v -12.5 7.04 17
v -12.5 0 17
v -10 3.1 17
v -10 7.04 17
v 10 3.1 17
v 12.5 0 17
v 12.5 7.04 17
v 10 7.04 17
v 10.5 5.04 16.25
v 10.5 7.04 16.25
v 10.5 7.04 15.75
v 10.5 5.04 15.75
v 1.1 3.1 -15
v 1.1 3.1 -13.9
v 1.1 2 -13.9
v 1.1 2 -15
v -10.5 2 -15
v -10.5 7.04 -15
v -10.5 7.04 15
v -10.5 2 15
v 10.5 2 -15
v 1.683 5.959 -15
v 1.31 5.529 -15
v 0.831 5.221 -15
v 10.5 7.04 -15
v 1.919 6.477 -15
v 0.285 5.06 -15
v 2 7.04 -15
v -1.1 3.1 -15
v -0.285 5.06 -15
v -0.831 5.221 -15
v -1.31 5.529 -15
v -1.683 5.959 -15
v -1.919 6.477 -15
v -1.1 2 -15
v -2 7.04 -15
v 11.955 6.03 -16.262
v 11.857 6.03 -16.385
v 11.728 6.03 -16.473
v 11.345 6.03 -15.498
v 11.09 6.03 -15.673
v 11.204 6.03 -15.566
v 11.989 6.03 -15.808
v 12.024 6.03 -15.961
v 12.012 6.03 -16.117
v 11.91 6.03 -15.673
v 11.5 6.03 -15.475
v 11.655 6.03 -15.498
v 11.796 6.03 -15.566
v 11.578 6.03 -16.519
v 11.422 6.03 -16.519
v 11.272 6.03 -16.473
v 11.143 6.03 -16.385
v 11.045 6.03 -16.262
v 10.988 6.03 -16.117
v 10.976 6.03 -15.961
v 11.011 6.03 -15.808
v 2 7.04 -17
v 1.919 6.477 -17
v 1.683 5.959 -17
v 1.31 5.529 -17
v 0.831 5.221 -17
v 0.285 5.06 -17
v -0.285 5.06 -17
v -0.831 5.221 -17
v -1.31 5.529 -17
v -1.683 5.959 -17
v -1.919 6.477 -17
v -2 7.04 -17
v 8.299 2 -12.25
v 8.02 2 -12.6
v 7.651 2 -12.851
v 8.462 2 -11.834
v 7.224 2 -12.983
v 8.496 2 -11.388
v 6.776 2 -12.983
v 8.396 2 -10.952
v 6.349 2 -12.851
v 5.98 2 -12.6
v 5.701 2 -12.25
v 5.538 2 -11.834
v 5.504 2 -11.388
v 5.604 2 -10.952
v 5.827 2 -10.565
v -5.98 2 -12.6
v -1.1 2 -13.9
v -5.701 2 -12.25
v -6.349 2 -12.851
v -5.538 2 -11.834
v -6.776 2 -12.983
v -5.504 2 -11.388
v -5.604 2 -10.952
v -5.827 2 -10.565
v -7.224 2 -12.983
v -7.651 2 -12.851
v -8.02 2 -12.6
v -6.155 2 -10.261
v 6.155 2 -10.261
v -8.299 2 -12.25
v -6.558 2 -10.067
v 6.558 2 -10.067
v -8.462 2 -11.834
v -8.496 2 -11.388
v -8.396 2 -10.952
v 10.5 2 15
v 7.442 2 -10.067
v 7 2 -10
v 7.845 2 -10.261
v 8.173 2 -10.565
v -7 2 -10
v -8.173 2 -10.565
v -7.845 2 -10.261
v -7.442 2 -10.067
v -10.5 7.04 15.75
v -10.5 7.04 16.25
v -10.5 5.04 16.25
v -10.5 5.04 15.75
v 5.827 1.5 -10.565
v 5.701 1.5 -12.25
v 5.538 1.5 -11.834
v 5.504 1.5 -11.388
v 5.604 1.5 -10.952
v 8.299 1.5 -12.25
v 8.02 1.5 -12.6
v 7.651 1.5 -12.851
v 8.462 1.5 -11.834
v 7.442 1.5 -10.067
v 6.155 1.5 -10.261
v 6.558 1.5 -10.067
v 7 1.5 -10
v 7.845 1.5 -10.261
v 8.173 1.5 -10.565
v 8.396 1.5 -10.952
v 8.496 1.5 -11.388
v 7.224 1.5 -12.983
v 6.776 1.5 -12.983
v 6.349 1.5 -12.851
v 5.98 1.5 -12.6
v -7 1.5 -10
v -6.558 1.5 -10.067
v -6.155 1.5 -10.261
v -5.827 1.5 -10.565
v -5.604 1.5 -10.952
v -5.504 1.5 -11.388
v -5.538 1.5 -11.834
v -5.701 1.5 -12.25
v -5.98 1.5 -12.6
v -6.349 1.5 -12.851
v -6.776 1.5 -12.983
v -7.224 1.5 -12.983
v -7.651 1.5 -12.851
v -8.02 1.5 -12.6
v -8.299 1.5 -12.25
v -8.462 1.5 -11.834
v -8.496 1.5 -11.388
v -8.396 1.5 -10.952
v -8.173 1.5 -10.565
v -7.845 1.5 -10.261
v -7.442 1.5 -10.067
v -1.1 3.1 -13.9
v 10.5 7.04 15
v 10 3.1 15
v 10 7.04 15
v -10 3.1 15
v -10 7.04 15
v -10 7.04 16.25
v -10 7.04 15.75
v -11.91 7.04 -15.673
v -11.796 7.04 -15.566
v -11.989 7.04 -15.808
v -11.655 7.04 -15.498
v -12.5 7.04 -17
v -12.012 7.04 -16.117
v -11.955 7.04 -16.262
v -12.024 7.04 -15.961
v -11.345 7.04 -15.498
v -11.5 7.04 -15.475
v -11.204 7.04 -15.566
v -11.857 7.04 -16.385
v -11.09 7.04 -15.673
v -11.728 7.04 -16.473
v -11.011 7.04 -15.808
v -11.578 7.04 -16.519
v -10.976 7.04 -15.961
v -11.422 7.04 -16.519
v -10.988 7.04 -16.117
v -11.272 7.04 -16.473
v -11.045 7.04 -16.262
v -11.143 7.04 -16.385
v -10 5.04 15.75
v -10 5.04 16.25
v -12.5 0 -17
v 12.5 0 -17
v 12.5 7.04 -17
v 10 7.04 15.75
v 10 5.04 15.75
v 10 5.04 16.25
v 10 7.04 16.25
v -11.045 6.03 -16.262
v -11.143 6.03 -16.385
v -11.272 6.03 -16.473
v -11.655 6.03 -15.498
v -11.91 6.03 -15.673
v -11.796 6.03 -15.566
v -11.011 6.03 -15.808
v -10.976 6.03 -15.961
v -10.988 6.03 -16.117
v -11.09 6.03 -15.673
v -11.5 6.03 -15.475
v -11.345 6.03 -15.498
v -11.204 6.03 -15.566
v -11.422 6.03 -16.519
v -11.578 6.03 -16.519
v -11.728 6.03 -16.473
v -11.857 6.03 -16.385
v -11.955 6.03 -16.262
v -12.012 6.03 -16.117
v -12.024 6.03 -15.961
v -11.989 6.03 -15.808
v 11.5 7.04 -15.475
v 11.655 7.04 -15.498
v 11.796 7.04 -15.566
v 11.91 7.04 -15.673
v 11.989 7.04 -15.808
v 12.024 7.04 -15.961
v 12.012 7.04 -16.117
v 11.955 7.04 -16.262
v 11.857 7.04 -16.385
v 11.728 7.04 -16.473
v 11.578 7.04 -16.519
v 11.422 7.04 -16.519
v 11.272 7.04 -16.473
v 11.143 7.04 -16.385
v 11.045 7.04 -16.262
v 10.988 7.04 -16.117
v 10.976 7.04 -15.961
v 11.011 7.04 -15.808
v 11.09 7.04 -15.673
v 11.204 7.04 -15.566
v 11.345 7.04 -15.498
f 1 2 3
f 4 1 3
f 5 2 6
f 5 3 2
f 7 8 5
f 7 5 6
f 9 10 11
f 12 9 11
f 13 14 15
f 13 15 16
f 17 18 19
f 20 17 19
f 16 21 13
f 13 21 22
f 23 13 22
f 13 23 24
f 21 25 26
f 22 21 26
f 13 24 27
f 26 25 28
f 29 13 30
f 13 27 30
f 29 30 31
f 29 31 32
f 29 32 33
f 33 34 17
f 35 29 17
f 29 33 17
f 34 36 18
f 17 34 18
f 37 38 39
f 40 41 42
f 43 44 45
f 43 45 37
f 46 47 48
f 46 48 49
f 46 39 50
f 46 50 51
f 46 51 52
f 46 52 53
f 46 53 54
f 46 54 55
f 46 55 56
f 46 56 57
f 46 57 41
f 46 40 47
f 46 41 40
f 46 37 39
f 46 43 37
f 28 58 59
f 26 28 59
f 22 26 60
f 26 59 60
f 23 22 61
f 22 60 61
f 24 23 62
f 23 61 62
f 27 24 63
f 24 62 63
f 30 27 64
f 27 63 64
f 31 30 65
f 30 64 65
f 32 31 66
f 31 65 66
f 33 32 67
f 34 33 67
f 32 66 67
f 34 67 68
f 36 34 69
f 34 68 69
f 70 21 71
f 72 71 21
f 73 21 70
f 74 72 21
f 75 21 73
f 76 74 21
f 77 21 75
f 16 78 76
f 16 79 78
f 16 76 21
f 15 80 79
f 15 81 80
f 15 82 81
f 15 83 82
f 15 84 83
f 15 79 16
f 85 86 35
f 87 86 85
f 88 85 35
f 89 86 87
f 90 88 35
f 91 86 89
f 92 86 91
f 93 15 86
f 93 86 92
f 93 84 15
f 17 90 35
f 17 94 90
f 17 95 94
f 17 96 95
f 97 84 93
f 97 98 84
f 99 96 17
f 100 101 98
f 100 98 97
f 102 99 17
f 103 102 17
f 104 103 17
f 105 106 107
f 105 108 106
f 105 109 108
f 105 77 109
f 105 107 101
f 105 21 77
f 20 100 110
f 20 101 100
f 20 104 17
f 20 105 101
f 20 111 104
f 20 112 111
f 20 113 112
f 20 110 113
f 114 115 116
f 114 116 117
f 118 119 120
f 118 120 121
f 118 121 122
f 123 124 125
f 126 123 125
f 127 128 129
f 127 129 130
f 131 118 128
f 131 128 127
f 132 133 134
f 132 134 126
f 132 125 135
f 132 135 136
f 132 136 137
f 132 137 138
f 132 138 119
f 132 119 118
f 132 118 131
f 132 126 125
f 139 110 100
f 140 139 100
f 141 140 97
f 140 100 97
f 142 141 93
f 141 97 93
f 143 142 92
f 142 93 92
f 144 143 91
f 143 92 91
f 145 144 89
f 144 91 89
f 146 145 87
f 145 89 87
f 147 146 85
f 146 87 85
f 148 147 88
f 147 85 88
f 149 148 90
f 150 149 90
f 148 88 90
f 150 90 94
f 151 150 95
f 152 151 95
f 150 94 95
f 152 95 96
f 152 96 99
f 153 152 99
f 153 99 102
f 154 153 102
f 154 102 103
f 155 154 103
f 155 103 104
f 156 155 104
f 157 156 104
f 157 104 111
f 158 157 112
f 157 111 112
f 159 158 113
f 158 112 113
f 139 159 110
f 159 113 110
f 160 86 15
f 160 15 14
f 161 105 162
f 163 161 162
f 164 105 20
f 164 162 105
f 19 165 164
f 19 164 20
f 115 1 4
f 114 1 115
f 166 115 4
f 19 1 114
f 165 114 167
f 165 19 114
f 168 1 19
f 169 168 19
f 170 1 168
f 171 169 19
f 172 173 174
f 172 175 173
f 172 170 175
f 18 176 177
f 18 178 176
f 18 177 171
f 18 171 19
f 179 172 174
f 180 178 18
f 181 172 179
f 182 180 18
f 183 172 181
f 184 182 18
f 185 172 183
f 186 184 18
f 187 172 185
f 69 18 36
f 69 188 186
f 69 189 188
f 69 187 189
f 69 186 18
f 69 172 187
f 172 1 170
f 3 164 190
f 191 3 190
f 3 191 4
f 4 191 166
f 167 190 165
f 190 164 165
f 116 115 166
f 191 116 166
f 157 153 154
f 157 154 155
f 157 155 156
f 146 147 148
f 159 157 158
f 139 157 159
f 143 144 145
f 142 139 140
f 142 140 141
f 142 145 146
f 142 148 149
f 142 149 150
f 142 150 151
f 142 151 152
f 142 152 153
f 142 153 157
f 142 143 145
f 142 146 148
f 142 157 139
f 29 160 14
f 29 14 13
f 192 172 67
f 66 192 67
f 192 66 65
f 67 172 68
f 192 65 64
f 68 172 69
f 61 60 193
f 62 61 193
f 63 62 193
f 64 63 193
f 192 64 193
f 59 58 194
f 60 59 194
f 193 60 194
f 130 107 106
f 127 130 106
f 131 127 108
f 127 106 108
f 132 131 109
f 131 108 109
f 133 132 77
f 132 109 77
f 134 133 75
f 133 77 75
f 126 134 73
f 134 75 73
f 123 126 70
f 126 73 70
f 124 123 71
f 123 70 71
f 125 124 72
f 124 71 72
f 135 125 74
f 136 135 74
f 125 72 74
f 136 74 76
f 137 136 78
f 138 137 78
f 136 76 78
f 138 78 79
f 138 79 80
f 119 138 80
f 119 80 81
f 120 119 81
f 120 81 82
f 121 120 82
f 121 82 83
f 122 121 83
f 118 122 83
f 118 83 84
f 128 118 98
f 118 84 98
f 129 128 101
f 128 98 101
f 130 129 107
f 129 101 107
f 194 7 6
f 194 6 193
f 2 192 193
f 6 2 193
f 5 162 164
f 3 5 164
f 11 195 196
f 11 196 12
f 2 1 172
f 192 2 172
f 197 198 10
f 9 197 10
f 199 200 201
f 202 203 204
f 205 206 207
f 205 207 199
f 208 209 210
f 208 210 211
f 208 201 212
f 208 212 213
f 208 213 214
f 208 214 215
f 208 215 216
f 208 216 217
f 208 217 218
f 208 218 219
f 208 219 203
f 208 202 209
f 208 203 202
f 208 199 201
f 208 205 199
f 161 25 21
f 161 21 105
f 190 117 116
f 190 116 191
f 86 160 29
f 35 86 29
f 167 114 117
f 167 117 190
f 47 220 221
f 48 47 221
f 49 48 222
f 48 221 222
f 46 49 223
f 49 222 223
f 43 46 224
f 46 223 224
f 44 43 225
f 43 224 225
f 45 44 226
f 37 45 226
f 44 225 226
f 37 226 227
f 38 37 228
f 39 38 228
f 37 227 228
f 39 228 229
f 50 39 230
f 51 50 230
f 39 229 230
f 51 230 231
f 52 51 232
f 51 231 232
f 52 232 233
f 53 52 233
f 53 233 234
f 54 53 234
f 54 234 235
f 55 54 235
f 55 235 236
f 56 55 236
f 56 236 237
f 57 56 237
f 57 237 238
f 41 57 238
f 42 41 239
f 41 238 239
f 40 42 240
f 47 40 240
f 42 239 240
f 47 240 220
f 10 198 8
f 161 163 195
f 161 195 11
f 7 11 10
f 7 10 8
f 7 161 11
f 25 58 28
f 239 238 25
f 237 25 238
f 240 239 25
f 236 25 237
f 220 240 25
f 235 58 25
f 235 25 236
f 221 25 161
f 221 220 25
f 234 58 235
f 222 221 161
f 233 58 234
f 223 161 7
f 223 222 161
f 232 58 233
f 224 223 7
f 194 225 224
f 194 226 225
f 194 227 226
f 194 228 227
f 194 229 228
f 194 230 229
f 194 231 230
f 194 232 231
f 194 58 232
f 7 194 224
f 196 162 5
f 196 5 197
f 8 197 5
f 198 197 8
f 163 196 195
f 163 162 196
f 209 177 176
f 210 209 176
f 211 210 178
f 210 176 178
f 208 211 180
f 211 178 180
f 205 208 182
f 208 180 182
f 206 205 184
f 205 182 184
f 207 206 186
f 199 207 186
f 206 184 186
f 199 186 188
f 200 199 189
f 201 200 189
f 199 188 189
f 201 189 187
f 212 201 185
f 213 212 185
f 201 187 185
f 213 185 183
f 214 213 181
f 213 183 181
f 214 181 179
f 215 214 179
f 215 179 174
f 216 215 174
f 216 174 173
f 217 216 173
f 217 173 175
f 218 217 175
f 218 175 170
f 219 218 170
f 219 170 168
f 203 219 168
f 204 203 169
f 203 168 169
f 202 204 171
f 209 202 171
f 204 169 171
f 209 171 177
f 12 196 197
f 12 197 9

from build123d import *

# Parameters (mm, degrees)
IZIM1_W                     = 25
IZIM1_H                     = 34
Y_KSEKLIK_EKSTR_ZYON1_DEPTH = 7.04
IZIM2_W                     = 21
IZIM2_H                     = 30
KES_EKSTR_ZYON1_DEPTH       = 5.04
IZIM3_W                     = 20
IZIM3_H                     = 3.94
KES_EKSTR_ZYON2_DEPTH       = 36.068669778
FEDER1_START                = -1.1
FEDER1_OUTLINE_W            = 1.1
FEDER1_OUTLINE_H            = 1.1
FEDER1_DEPTH                = 2.2
IZIM7_W                     = 1
IZIM7_H                     = 0.5
KES_EKSTR_ZYON3_DEPTH       = 2
IZIM9_R                     = 2
KES_EKSTR_ZYON4_DEPTH       = 2
IZIM10_R                    = 1.5
KES_EKSTR_ZYON5_DEPTH       = 0.5
IZIM11_R                    = 0.525
KES_EKSTR_ZYON6_DEPTH       = 1.01


# Read off the part's stored shape, not the designer's step: Feder1
with BuildPart() as part:
    # Çizim1 → Yükseklik-Ekstrüzyon1 (new body)
    with BuildSketch(Plane(origin=(0, 7.04, 0), x_dir=(1, 0, 0), z_dir=(0, 1, 0))):
        Rectangle(IZIM1_W, IZIM1_H)
    extrude(amount=-Y_KSEKLIK_EKSTR_ZYON1_DEPTH)

    # Çizim2 → Kes-Ekstrüzyon1 (cut)
    with BuildSketch(Plane(origin=(0, 7.04, 0), x_dir=(-1, 0, 0), z_dir=(0, 1, 0))):
        Rectangle(IZIM2_W, IZIM2_H)
    extrude(amount=-KES_EKSTR_ZYON1_DEPTH, mode=Mode.SUBTRACT)

    # Çizim3 → Kes-Ekstrüzyon2 (cut, through all)
    with BuildSketch(Plane(origin=(0, 0, 15), x_dir=(-1, 0, 0), z_dir=(0, 0, -1))):
        with Locations((0, 5.07)):
            Rectangle(IZIM3_W, IZIM3_H)
    extrude(amount=-KES_EKSTR_ZYON2_DEPTH, mode=Mode.SUBTRACT)

    # Feder1 outline → Feder1 (add)
    with BuildSketch(Plane(origin=(0, 0, 0), x_dir=(0, 0, -1), z_dir=(1, 0, 0)).offset(FEDER1_START)):
        with Locations((14.45, 2.55)):
            Rectangle(FEDER1_OUTLINE_W, FEDER1_OUTLINE_H)
    extrude(amount=FEDER1_DEPTH)

    # Çizim7 → Kes-Ekstrüzyon3 (cut)
    with BuildSketch(Plane(origin=(0, 7.04, 0), x_dir=(1, 0, 0), z_dir=(0, 1, 0))):
        with Locations((-10, -16)):
            Rectangle(IZIM7_W, IZIM7_H)
        with Locations((10, -16)):
            Rectangle(IZIM7_W, IZIM7_H)
    extrude(amount=-KES_EKSTR_ZYON3_DEPTH, mode=Mode.SUBTRACT)

    # Çizim9 → Kes-Ekstrüzyon4 (cut)
    with BuildSketch(Plane(origin=(0, 0, -17), x_dir=(-1, 0, 0), z_dir=(0, 0, -1))):
        with Locations((0, 7.04)):
            Circle(IZIM9_R)
    extrude(amount=-KES_EKSTR_ZYON4_DEPTH, mode=Mode.SUBTRACT)

    # Çizim10 → Kes-Ekstrüzyon5 (cut)
    with BuildSketch(Plane(origin=(0, 2, 0), x_dir=(1, 0, 0), z_dir=(0, 1, 0))):
        with Locations(Location((-7, 11.5, 0), (0, 0, 270))):
            Circle(IZIM10_R)
        with Locations(Location((7, 11.5, 0), (0, 0, 270))):
            Circle(IZIM10_R)
    extrude(amount=-KES_EKSTR_ZYON5_DEPTH, mode=Mode.SUBTRACT)

    # Çizim11 → Kes-Ekstrüzyon6 (cut)
    with BuildSketch(Plane(origin=(0, 7.04, 0), x_dir=(1, 0, 0), z_dir=(0, 1, 0))):
        with Locations(Location((-11.5, 16, 0), (0, 0, 270))):
            Circle(IZIM11_R)
        with Locations(Location((11.5, 16, 0), (0, 0, 270))):
            Circle(IZIM11_R)
    extrude(amount=-KES_EKSTR_ZYON6_DEPTH, mode=Mode.SUBTRACT)


solid = part.part
